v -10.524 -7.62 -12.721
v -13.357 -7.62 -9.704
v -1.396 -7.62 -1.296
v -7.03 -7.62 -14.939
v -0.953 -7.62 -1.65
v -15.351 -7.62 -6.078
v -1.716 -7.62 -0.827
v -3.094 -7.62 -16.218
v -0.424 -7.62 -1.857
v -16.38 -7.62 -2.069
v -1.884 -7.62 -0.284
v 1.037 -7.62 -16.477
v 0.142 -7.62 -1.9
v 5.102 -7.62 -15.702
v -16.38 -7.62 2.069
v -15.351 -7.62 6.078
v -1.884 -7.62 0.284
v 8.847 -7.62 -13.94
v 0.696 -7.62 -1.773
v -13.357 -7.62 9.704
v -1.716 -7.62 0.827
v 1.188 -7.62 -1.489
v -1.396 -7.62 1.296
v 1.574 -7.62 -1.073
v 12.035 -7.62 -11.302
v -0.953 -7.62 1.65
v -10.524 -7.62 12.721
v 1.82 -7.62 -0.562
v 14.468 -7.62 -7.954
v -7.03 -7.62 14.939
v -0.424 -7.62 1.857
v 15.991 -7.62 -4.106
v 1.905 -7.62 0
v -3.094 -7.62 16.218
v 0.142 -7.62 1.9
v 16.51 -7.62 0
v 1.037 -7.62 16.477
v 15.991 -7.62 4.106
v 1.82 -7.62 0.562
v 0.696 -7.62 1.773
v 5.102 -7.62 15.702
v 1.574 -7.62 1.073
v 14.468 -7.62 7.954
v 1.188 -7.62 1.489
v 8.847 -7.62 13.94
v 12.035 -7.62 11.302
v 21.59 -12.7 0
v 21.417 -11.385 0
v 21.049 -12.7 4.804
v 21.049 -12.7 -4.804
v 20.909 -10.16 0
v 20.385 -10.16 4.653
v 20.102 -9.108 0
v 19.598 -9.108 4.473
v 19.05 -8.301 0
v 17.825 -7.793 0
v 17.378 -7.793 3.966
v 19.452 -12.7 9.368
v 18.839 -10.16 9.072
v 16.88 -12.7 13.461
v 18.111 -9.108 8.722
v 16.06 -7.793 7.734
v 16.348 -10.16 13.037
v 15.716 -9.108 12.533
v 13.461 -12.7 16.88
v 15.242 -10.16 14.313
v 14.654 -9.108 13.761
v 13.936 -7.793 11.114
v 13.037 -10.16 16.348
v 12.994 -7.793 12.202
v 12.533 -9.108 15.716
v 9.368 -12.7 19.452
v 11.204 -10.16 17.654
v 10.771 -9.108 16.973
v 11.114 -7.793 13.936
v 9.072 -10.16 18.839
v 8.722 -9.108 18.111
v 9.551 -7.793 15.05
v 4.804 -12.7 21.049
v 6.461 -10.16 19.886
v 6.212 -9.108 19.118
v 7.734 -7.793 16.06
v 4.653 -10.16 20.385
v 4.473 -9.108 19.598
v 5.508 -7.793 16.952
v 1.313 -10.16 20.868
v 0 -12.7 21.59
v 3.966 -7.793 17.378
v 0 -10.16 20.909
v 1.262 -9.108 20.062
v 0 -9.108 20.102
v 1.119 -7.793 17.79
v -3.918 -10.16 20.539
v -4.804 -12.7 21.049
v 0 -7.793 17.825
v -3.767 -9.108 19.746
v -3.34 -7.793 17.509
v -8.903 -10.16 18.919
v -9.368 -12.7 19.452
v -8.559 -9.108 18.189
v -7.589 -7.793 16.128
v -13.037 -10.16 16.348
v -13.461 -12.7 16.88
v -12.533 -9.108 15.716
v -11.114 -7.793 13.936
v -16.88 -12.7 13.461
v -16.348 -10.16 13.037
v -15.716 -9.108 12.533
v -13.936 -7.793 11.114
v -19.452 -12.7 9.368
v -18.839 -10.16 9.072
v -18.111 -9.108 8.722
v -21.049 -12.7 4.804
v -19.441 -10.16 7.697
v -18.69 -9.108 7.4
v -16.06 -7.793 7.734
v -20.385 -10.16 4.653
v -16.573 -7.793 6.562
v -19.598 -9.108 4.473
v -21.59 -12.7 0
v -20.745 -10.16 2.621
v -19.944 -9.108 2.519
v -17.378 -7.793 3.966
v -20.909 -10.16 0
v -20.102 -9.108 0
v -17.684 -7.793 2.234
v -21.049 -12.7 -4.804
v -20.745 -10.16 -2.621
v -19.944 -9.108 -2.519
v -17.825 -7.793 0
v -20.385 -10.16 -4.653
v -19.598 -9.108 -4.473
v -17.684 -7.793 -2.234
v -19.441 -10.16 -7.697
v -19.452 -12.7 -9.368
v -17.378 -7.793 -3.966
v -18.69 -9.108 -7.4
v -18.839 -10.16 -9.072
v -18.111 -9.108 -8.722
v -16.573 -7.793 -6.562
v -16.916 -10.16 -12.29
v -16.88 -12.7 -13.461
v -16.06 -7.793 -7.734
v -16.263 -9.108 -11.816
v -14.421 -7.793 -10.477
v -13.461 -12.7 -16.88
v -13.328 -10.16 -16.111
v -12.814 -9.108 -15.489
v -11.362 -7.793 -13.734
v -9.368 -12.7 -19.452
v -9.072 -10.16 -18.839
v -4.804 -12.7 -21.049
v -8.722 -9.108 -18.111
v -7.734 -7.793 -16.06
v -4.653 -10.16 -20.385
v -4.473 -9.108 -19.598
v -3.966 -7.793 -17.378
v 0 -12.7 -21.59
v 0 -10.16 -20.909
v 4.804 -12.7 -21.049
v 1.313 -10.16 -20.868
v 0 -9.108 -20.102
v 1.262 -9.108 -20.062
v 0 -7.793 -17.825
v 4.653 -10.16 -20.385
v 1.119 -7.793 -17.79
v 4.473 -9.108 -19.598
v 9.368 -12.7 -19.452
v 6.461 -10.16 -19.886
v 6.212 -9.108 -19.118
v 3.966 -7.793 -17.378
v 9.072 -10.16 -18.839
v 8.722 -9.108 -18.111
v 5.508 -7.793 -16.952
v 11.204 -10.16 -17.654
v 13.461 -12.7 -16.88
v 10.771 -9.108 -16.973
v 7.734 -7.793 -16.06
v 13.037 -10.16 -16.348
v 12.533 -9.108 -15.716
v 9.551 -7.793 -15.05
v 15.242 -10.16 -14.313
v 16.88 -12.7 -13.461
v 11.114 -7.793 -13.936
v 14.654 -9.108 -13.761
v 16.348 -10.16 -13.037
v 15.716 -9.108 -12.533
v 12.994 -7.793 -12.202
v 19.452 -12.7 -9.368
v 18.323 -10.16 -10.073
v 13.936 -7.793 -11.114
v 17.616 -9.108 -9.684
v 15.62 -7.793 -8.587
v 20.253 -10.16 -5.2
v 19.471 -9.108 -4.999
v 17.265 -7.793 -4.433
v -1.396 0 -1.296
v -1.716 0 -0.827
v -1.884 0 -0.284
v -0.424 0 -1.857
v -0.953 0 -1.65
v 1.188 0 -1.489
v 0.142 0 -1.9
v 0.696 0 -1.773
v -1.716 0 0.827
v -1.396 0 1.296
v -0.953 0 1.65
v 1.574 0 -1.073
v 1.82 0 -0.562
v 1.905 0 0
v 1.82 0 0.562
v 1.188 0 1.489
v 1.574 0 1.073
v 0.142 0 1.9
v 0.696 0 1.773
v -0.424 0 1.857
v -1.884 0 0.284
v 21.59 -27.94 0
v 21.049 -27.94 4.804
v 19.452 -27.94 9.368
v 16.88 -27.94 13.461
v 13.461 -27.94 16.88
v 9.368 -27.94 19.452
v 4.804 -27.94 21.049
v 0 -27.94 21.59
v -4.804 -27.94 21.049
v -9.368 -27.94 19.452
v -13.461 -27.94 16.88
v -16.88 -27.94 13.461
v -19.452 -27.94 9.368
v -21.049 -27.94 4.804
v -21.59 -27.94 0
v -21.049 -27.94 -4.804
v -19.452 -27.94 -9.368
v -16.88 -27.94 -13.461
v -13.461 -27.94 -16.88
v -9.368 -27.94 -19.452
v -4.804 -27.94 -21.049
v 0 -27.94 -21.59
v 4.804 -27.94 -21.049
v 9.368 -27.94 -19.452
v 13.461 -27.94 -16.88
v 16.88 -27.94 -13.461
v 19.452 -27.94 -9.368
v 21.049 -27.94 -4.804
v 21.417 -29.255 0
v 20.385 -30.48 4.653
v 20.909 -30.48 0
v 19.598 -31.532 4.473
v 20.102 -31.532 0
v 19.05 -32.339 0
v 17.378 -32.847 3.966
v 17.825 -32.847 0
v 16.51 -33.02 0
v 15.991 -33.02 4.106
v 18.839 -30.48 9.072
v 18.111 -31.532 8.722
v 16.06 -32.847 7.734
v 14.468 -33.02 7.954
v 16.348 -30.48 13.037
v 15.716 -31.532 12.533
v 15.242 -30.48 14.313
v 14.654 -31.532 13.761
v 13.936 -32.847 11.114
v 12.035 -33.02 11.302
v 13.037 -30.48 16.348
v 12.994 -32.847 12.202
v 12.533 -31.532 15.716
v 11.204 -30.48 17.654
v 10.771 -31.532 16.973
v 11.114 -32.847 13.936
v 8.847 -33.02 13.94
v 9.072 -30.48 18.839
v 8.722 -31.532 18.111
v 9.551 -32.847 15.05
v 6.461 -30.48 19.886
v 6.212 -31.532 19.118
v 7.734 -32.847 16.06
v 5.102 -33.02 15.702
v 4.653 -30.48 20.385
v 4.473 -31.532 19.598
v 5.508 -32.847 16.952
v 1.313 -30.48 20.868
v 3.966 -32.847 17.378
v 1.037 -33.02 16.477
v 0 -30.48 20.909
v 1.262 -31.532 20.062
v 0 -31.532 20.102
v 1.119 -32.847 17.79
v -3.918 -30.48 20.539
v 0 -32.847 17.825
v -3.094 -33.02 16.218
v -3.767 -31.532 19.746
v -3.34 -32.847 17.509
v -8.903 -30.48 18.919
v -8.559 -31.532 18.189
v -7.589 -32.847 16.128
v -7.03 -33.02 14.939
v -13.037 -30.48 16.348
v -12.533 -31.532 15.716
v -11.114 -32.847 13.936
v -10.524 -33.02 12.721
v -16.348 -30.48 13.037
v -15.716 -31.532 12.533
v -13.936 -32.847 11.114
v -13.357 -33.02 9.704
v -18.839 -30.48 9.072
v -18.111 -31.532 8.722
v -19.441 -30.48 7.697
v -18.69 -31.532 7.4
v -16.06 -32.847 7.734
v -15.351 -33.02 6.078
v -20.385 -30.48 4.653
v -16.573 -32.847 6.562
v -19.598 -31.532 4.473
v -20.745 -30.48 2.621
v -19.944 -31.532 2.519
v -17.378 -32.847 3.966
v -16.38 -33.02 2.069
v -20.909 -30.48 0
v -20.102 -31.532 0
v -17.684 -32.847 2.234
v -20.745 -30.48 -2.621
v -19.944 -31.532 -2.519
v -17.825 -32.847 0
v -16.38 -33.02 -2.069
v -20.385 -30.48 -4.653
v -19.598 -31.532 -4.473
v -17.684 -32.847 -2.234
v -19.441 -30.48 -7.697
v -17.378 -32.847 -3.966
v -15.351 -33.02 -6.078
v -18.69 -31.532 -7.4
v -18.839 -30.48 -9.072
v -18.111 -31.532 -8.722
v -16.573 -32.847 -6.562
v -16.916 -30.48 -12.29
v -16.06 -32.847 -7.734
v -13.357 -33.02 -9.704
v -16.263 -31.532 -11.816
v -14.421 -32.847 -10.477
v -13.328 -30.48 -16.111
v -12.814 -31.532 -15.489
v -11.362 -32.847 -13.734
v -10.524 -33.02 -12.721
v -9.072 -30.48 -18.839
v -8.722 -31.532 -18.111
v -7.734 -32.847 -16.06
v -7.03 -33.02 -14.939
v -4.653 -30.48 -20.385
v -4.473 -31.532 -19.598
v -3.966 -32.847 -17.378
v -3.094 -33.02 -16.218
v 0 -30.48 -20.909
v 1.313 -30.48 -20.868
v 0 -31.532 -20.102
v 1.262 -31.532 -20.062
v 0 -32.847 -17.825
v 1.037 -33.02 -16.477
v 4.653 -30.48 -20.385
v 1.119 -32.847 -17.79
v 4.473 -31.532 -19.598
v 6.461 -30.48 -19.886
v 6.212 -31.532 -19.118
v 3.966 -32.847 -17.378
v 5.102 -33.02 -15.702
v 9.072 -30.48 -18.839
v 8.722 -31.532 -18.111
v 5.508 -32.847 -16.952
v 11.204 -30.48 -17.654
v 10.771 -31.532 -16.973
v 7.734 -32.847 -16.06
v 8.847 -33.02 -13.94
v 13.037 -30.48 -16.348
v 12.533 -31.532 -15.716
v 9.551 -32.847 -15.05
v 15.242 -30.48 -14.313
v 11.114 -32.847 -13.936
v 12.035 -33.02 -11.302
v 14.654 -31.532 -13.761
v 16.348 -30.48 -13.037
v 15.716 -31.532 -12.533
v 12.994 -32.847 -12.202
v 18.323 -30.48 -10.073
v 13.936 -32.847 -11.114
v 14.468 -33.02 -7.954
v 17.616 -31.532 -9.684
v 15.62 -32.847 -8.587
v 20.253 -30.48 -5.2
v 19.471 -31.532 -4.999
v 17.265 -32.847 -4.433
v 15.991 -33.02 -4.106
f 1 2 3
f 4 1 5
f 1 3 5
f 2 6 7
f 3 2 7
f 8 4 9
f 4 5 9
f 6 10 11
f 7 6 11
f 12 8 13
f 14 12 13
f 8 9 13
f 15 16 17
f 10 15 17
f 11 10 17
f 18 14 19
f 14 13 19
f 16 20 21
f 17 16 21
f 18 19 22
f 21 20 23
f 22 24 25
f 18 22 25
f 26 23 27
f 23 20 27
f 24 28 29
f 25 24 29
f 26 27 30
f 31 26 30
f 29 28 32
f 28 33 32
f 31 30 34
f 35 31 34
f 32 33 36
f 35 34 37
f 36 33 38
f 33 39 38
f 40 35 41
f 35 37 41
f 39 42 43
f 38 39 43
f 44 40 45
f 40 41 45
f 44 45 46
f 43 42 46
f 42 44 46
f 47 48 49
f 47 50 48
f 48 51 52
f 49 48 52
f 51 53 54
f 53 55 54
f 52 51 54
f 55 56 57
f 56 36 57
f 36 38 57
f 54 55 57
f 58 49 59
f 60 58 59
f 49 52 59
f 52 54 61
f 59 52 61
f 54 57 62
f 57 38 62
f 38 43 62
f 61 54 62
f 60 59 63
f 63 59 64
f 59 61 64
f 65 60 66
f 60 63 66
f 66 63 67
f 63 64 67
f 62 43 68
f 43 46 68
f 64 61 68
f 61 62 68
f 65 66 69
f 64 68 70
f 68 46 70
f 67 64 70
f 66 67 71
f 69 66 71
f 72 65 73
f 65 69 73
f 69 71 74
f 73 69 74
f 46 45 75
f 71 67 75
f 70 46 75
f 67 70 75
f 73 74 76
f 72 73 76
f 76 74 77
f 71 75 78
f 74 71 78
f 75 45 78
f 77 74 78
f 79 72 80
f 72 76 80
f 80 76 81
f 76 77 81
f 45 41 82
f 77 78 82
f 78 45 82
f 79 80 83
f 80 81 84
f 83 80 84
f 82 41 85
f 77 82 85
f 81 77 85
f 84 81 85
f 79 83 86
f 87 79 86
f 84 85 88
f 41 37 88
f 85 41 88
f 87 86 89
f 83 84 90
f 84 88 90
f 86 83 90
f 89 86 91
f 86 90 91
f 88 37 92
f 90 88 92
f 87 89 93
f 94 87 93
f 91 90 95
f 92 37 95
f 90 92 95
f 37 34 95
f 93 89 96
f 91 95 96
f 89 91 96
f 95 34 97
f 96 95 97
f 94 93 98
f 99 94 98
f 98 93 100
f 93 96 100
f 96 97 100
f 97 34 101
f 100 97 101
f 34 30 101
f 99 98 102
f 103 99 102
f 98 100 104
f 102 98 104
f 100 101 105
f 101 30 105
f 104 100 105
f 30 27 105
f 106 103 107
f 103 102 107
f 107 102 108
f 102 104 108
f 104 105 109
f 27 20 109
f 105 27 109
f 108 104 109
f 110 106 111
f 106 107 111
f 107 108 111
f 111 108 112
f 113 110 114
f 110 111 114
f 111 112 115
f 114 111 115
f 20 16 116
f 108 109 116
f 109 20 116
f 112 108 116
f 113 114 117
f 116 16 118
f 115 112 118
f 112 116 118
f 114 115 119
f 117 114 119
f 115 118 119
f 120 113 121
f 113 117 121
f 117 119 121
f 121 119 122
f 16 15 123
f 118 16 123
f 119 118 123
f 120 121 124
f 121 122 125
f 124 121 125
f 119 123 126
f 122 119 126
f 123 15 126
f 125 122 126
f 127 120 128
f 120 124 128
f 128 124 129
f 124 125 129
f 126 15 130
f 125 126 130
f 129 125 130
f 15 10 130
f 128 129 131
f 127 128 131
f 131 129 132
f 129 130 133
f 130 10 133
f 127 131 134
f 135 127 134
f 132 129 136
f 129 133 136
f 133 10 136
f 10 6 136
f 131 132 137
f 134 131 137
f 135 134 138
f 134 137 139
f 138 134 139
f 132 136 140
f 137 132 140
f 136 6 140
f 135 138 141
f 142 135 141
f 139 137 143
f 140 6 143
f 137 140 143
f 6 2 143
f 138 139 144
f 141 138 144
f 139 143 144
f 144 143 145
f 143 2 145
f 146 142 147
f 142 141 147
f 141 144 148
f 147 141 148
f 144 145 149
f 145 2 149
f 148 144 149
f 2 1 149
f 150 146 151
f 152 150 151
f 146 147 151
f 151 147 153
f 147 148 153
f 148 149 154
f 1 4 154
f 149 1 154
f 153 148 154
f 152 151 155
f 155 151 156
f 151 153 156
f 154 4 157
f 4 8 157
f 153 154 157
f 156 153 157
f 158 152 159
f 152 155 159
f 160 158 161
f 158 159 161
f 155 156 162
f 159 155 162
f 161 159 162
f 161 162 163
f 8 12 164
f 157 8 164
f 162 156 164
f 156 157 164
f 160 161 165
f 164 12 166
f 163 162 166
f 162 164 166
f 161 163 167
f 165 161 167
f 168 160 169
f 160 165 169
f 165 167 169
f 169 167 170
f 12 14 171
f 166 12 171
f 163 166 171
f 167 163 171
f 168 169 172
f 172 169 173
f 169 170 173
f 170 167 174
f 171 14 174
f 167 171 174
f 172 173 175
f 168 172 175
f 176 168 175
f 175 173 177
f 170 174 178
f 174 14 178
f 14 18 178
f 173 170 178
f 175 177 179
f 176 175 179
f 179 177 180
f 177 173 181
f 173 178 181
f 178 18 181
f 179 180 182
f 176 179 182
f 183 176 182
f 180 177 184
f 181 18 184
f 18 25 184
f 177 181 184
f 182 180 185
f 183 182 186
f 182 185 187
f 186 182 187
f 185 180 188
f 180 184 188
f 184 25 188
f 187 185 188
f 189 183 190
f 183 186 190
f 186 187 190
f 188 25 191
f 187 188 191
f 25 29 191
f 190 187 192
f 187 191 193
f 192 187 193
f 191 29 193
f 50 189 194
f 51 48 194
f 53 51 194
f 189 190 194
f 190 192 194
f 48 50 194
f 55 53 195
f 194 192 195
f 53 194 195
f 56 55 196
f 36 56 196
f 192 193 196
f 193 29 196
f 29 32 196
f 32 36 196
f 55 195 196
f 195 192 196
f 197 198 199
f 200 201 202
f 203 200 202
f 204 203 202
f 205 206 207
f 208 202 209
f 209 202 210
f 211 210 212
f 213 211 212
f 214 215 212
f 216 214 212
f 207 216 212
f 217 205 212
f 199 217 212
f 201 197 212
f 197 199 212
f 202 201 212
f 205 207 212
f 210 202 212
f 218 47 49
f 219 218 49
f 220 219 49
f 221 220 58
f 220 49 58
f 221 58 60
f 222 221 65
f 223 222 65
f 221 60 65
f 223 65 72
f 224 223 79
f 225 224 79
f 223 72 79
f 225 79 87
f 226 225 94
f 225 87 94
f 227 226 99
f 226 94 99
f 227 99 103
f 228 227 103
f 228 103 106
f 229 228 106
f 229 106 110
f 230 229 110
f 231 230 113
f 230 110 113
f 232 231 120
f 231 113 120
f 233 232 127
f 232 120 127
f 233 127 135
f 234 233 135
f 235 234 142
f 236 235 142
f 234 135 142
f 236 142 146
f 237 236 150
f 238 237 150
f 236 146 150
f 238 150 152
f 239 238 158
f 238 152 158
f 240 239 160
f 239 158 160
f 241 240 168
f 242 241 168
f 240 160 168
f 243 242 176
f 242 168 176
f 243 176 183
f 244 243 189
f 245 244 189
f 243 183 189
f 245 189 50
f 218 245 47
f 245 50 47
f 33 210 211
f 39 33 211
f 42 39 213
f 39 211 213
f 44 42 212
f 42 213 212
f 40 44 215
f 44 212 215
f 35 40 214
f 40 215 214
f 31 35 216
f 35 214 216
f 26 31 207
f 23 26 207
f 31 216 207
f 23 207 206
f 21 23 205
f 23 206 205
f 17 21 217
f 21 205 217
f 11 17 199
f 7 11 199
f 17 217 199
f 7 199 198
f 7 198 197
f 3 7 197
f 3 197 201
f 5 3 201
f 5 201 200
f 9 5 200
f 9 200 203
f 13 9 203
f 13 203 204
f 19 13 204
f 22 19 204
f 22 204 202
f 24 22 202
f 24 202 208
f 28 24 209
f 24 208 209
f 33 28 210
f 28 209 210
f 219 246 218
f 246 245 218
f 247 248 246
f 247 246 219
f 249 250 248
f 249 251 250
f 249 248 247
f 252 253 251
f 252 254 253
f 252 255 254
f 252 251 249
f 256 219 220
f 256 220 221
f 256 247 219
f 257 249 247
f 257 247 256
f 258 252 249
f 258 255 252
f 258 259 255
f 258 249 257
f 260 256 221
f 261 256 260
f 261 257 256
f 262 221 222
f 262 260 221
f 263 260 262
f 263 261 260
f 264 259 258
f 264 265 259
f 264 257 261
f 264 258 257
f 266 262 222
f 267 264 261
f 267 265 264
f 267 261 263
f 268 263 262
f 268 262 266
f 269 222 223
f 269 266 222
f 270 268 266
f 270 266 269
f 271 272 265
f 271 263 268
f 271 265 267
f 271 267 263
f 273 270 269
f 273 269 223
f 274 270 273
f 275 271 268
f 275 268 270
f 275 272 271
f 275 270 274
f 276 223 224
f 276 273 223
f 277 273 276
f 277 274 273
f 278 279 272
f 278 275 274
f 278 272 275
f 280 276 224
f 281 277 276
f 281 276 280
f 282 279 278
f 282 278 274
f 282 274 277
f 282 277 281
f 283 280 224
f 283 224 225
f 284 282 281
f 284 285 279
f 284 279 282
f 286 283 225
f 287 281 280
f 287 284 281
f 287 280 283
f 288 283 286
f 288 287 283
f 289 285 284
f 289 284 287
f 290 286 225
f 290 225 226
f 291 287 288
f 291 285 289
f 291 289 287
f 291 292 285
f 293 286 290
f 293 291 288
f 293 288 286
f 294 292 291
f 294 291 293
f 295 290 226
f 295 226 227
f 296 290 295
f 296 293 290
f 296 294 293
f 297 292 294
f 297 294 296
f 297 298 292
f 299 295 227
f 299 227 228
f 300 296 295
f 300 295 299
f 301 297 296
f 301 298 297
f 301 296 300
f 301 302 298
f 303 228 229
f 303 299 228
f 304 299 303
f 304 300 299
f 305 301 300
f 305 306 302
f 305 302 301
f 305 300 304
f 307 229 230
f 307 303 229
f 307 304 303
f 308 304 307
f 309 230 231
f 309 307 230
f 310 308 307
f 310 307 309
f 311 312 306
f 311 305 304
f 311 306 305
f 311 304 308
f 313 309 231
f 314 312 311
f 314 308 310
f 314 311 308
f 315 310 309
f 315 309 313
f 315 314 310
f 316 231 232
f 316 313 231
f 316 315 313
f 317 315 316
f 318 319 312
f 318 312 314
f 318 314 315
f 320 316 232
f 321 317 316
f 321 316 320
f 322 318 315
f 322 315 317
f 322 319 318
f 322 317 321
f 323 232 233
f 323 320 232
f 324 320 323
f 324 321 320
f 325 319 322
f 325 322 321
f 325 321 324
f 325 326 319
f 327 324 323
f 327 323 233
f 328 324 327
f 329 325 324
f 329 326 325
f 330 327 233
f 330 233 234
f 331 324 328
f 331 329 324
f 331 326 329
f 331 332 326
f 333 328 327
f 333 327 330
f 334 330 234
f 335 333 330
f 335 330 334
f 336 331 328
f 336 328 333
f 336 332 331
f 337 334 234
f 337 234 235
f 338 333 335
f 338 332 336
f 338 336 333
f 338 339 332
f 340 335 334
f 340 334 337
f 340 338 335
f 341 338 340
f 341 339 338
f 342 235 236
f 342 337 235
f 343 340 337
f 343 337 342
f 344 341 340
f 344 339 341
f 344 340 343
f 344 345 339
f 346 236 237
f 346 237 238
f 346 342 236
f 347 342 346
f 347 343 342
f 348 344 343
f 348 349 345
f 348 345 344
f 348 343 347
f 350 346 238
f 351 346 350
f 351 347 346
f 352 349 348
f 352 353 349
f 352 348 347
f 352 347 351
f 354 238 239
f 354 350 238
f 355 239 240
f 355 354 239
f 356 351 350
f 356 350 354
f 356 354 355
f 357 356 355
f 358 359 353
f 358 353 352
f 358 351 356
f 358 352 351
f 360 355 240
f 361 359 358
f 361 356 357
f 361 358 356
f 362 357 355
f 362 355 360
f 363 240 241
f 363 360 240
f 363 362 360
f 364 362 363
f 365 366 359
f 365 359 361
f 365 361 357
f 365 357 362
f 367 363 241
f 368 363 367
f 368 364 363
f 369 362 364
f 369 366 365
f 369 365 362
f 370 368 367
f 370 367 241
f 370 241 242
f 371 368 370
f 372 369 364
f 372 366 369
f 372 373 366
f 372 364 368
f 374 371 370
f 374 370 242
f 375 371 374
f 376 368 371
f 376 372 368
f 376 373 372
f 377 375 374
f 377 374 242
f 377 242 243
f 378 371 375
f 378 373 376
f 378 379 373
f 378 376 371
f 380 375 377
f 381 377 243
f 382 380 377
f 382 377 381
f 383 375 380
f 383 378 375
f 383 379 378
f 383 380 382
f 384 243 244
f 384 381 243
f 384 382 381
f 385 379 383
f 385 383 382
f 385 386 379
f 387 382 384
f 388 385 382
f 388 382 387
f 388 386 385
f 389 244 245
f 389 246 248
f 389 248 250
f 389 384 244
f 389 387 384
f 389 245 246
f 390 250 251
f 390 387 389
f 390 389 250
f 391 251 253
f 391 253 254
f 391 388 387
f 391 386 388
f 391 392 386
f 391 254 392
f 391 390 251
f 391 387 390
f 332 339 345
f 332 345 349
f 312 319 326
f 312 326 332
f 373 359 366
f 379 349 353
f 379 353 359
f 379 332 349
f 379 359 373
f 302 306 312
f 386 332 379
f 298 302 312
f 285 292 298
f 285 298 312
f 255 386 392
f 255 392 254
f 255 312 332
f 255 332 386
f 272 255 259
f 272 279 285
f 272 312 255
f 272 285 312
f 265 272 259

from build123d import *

# Parameters (mm, degrees)
F0_R     = 1.905
F1_DEPTH = 7.62
F2_R     = 21.59
F3_DEPTH = 25.4
F4_R     = 5.08


with BuildPart() as f1:
    # F0 (on Front) → F1 (new body)
    with BuildSketch(Plane.XZ):
        Circle(F0_R)
    extrude(amount=F1_DEPTH)

    # F2 (on face) → F3 (join)
    with BuildSketch(Plane.XZ.offset(7.62)):
        Circle(F2_R)
    extrude(amount=F3_DEPTH)

    # F4
    f4_edges = [f1.edges().sort_by_distance(p)[0] for p in [
        (-21.59, -33.02, 0),
        (-21.59, -7.62, 0),
    ]]
    fillet(f4_edges, radius=F4_R)


solid = f1.part
